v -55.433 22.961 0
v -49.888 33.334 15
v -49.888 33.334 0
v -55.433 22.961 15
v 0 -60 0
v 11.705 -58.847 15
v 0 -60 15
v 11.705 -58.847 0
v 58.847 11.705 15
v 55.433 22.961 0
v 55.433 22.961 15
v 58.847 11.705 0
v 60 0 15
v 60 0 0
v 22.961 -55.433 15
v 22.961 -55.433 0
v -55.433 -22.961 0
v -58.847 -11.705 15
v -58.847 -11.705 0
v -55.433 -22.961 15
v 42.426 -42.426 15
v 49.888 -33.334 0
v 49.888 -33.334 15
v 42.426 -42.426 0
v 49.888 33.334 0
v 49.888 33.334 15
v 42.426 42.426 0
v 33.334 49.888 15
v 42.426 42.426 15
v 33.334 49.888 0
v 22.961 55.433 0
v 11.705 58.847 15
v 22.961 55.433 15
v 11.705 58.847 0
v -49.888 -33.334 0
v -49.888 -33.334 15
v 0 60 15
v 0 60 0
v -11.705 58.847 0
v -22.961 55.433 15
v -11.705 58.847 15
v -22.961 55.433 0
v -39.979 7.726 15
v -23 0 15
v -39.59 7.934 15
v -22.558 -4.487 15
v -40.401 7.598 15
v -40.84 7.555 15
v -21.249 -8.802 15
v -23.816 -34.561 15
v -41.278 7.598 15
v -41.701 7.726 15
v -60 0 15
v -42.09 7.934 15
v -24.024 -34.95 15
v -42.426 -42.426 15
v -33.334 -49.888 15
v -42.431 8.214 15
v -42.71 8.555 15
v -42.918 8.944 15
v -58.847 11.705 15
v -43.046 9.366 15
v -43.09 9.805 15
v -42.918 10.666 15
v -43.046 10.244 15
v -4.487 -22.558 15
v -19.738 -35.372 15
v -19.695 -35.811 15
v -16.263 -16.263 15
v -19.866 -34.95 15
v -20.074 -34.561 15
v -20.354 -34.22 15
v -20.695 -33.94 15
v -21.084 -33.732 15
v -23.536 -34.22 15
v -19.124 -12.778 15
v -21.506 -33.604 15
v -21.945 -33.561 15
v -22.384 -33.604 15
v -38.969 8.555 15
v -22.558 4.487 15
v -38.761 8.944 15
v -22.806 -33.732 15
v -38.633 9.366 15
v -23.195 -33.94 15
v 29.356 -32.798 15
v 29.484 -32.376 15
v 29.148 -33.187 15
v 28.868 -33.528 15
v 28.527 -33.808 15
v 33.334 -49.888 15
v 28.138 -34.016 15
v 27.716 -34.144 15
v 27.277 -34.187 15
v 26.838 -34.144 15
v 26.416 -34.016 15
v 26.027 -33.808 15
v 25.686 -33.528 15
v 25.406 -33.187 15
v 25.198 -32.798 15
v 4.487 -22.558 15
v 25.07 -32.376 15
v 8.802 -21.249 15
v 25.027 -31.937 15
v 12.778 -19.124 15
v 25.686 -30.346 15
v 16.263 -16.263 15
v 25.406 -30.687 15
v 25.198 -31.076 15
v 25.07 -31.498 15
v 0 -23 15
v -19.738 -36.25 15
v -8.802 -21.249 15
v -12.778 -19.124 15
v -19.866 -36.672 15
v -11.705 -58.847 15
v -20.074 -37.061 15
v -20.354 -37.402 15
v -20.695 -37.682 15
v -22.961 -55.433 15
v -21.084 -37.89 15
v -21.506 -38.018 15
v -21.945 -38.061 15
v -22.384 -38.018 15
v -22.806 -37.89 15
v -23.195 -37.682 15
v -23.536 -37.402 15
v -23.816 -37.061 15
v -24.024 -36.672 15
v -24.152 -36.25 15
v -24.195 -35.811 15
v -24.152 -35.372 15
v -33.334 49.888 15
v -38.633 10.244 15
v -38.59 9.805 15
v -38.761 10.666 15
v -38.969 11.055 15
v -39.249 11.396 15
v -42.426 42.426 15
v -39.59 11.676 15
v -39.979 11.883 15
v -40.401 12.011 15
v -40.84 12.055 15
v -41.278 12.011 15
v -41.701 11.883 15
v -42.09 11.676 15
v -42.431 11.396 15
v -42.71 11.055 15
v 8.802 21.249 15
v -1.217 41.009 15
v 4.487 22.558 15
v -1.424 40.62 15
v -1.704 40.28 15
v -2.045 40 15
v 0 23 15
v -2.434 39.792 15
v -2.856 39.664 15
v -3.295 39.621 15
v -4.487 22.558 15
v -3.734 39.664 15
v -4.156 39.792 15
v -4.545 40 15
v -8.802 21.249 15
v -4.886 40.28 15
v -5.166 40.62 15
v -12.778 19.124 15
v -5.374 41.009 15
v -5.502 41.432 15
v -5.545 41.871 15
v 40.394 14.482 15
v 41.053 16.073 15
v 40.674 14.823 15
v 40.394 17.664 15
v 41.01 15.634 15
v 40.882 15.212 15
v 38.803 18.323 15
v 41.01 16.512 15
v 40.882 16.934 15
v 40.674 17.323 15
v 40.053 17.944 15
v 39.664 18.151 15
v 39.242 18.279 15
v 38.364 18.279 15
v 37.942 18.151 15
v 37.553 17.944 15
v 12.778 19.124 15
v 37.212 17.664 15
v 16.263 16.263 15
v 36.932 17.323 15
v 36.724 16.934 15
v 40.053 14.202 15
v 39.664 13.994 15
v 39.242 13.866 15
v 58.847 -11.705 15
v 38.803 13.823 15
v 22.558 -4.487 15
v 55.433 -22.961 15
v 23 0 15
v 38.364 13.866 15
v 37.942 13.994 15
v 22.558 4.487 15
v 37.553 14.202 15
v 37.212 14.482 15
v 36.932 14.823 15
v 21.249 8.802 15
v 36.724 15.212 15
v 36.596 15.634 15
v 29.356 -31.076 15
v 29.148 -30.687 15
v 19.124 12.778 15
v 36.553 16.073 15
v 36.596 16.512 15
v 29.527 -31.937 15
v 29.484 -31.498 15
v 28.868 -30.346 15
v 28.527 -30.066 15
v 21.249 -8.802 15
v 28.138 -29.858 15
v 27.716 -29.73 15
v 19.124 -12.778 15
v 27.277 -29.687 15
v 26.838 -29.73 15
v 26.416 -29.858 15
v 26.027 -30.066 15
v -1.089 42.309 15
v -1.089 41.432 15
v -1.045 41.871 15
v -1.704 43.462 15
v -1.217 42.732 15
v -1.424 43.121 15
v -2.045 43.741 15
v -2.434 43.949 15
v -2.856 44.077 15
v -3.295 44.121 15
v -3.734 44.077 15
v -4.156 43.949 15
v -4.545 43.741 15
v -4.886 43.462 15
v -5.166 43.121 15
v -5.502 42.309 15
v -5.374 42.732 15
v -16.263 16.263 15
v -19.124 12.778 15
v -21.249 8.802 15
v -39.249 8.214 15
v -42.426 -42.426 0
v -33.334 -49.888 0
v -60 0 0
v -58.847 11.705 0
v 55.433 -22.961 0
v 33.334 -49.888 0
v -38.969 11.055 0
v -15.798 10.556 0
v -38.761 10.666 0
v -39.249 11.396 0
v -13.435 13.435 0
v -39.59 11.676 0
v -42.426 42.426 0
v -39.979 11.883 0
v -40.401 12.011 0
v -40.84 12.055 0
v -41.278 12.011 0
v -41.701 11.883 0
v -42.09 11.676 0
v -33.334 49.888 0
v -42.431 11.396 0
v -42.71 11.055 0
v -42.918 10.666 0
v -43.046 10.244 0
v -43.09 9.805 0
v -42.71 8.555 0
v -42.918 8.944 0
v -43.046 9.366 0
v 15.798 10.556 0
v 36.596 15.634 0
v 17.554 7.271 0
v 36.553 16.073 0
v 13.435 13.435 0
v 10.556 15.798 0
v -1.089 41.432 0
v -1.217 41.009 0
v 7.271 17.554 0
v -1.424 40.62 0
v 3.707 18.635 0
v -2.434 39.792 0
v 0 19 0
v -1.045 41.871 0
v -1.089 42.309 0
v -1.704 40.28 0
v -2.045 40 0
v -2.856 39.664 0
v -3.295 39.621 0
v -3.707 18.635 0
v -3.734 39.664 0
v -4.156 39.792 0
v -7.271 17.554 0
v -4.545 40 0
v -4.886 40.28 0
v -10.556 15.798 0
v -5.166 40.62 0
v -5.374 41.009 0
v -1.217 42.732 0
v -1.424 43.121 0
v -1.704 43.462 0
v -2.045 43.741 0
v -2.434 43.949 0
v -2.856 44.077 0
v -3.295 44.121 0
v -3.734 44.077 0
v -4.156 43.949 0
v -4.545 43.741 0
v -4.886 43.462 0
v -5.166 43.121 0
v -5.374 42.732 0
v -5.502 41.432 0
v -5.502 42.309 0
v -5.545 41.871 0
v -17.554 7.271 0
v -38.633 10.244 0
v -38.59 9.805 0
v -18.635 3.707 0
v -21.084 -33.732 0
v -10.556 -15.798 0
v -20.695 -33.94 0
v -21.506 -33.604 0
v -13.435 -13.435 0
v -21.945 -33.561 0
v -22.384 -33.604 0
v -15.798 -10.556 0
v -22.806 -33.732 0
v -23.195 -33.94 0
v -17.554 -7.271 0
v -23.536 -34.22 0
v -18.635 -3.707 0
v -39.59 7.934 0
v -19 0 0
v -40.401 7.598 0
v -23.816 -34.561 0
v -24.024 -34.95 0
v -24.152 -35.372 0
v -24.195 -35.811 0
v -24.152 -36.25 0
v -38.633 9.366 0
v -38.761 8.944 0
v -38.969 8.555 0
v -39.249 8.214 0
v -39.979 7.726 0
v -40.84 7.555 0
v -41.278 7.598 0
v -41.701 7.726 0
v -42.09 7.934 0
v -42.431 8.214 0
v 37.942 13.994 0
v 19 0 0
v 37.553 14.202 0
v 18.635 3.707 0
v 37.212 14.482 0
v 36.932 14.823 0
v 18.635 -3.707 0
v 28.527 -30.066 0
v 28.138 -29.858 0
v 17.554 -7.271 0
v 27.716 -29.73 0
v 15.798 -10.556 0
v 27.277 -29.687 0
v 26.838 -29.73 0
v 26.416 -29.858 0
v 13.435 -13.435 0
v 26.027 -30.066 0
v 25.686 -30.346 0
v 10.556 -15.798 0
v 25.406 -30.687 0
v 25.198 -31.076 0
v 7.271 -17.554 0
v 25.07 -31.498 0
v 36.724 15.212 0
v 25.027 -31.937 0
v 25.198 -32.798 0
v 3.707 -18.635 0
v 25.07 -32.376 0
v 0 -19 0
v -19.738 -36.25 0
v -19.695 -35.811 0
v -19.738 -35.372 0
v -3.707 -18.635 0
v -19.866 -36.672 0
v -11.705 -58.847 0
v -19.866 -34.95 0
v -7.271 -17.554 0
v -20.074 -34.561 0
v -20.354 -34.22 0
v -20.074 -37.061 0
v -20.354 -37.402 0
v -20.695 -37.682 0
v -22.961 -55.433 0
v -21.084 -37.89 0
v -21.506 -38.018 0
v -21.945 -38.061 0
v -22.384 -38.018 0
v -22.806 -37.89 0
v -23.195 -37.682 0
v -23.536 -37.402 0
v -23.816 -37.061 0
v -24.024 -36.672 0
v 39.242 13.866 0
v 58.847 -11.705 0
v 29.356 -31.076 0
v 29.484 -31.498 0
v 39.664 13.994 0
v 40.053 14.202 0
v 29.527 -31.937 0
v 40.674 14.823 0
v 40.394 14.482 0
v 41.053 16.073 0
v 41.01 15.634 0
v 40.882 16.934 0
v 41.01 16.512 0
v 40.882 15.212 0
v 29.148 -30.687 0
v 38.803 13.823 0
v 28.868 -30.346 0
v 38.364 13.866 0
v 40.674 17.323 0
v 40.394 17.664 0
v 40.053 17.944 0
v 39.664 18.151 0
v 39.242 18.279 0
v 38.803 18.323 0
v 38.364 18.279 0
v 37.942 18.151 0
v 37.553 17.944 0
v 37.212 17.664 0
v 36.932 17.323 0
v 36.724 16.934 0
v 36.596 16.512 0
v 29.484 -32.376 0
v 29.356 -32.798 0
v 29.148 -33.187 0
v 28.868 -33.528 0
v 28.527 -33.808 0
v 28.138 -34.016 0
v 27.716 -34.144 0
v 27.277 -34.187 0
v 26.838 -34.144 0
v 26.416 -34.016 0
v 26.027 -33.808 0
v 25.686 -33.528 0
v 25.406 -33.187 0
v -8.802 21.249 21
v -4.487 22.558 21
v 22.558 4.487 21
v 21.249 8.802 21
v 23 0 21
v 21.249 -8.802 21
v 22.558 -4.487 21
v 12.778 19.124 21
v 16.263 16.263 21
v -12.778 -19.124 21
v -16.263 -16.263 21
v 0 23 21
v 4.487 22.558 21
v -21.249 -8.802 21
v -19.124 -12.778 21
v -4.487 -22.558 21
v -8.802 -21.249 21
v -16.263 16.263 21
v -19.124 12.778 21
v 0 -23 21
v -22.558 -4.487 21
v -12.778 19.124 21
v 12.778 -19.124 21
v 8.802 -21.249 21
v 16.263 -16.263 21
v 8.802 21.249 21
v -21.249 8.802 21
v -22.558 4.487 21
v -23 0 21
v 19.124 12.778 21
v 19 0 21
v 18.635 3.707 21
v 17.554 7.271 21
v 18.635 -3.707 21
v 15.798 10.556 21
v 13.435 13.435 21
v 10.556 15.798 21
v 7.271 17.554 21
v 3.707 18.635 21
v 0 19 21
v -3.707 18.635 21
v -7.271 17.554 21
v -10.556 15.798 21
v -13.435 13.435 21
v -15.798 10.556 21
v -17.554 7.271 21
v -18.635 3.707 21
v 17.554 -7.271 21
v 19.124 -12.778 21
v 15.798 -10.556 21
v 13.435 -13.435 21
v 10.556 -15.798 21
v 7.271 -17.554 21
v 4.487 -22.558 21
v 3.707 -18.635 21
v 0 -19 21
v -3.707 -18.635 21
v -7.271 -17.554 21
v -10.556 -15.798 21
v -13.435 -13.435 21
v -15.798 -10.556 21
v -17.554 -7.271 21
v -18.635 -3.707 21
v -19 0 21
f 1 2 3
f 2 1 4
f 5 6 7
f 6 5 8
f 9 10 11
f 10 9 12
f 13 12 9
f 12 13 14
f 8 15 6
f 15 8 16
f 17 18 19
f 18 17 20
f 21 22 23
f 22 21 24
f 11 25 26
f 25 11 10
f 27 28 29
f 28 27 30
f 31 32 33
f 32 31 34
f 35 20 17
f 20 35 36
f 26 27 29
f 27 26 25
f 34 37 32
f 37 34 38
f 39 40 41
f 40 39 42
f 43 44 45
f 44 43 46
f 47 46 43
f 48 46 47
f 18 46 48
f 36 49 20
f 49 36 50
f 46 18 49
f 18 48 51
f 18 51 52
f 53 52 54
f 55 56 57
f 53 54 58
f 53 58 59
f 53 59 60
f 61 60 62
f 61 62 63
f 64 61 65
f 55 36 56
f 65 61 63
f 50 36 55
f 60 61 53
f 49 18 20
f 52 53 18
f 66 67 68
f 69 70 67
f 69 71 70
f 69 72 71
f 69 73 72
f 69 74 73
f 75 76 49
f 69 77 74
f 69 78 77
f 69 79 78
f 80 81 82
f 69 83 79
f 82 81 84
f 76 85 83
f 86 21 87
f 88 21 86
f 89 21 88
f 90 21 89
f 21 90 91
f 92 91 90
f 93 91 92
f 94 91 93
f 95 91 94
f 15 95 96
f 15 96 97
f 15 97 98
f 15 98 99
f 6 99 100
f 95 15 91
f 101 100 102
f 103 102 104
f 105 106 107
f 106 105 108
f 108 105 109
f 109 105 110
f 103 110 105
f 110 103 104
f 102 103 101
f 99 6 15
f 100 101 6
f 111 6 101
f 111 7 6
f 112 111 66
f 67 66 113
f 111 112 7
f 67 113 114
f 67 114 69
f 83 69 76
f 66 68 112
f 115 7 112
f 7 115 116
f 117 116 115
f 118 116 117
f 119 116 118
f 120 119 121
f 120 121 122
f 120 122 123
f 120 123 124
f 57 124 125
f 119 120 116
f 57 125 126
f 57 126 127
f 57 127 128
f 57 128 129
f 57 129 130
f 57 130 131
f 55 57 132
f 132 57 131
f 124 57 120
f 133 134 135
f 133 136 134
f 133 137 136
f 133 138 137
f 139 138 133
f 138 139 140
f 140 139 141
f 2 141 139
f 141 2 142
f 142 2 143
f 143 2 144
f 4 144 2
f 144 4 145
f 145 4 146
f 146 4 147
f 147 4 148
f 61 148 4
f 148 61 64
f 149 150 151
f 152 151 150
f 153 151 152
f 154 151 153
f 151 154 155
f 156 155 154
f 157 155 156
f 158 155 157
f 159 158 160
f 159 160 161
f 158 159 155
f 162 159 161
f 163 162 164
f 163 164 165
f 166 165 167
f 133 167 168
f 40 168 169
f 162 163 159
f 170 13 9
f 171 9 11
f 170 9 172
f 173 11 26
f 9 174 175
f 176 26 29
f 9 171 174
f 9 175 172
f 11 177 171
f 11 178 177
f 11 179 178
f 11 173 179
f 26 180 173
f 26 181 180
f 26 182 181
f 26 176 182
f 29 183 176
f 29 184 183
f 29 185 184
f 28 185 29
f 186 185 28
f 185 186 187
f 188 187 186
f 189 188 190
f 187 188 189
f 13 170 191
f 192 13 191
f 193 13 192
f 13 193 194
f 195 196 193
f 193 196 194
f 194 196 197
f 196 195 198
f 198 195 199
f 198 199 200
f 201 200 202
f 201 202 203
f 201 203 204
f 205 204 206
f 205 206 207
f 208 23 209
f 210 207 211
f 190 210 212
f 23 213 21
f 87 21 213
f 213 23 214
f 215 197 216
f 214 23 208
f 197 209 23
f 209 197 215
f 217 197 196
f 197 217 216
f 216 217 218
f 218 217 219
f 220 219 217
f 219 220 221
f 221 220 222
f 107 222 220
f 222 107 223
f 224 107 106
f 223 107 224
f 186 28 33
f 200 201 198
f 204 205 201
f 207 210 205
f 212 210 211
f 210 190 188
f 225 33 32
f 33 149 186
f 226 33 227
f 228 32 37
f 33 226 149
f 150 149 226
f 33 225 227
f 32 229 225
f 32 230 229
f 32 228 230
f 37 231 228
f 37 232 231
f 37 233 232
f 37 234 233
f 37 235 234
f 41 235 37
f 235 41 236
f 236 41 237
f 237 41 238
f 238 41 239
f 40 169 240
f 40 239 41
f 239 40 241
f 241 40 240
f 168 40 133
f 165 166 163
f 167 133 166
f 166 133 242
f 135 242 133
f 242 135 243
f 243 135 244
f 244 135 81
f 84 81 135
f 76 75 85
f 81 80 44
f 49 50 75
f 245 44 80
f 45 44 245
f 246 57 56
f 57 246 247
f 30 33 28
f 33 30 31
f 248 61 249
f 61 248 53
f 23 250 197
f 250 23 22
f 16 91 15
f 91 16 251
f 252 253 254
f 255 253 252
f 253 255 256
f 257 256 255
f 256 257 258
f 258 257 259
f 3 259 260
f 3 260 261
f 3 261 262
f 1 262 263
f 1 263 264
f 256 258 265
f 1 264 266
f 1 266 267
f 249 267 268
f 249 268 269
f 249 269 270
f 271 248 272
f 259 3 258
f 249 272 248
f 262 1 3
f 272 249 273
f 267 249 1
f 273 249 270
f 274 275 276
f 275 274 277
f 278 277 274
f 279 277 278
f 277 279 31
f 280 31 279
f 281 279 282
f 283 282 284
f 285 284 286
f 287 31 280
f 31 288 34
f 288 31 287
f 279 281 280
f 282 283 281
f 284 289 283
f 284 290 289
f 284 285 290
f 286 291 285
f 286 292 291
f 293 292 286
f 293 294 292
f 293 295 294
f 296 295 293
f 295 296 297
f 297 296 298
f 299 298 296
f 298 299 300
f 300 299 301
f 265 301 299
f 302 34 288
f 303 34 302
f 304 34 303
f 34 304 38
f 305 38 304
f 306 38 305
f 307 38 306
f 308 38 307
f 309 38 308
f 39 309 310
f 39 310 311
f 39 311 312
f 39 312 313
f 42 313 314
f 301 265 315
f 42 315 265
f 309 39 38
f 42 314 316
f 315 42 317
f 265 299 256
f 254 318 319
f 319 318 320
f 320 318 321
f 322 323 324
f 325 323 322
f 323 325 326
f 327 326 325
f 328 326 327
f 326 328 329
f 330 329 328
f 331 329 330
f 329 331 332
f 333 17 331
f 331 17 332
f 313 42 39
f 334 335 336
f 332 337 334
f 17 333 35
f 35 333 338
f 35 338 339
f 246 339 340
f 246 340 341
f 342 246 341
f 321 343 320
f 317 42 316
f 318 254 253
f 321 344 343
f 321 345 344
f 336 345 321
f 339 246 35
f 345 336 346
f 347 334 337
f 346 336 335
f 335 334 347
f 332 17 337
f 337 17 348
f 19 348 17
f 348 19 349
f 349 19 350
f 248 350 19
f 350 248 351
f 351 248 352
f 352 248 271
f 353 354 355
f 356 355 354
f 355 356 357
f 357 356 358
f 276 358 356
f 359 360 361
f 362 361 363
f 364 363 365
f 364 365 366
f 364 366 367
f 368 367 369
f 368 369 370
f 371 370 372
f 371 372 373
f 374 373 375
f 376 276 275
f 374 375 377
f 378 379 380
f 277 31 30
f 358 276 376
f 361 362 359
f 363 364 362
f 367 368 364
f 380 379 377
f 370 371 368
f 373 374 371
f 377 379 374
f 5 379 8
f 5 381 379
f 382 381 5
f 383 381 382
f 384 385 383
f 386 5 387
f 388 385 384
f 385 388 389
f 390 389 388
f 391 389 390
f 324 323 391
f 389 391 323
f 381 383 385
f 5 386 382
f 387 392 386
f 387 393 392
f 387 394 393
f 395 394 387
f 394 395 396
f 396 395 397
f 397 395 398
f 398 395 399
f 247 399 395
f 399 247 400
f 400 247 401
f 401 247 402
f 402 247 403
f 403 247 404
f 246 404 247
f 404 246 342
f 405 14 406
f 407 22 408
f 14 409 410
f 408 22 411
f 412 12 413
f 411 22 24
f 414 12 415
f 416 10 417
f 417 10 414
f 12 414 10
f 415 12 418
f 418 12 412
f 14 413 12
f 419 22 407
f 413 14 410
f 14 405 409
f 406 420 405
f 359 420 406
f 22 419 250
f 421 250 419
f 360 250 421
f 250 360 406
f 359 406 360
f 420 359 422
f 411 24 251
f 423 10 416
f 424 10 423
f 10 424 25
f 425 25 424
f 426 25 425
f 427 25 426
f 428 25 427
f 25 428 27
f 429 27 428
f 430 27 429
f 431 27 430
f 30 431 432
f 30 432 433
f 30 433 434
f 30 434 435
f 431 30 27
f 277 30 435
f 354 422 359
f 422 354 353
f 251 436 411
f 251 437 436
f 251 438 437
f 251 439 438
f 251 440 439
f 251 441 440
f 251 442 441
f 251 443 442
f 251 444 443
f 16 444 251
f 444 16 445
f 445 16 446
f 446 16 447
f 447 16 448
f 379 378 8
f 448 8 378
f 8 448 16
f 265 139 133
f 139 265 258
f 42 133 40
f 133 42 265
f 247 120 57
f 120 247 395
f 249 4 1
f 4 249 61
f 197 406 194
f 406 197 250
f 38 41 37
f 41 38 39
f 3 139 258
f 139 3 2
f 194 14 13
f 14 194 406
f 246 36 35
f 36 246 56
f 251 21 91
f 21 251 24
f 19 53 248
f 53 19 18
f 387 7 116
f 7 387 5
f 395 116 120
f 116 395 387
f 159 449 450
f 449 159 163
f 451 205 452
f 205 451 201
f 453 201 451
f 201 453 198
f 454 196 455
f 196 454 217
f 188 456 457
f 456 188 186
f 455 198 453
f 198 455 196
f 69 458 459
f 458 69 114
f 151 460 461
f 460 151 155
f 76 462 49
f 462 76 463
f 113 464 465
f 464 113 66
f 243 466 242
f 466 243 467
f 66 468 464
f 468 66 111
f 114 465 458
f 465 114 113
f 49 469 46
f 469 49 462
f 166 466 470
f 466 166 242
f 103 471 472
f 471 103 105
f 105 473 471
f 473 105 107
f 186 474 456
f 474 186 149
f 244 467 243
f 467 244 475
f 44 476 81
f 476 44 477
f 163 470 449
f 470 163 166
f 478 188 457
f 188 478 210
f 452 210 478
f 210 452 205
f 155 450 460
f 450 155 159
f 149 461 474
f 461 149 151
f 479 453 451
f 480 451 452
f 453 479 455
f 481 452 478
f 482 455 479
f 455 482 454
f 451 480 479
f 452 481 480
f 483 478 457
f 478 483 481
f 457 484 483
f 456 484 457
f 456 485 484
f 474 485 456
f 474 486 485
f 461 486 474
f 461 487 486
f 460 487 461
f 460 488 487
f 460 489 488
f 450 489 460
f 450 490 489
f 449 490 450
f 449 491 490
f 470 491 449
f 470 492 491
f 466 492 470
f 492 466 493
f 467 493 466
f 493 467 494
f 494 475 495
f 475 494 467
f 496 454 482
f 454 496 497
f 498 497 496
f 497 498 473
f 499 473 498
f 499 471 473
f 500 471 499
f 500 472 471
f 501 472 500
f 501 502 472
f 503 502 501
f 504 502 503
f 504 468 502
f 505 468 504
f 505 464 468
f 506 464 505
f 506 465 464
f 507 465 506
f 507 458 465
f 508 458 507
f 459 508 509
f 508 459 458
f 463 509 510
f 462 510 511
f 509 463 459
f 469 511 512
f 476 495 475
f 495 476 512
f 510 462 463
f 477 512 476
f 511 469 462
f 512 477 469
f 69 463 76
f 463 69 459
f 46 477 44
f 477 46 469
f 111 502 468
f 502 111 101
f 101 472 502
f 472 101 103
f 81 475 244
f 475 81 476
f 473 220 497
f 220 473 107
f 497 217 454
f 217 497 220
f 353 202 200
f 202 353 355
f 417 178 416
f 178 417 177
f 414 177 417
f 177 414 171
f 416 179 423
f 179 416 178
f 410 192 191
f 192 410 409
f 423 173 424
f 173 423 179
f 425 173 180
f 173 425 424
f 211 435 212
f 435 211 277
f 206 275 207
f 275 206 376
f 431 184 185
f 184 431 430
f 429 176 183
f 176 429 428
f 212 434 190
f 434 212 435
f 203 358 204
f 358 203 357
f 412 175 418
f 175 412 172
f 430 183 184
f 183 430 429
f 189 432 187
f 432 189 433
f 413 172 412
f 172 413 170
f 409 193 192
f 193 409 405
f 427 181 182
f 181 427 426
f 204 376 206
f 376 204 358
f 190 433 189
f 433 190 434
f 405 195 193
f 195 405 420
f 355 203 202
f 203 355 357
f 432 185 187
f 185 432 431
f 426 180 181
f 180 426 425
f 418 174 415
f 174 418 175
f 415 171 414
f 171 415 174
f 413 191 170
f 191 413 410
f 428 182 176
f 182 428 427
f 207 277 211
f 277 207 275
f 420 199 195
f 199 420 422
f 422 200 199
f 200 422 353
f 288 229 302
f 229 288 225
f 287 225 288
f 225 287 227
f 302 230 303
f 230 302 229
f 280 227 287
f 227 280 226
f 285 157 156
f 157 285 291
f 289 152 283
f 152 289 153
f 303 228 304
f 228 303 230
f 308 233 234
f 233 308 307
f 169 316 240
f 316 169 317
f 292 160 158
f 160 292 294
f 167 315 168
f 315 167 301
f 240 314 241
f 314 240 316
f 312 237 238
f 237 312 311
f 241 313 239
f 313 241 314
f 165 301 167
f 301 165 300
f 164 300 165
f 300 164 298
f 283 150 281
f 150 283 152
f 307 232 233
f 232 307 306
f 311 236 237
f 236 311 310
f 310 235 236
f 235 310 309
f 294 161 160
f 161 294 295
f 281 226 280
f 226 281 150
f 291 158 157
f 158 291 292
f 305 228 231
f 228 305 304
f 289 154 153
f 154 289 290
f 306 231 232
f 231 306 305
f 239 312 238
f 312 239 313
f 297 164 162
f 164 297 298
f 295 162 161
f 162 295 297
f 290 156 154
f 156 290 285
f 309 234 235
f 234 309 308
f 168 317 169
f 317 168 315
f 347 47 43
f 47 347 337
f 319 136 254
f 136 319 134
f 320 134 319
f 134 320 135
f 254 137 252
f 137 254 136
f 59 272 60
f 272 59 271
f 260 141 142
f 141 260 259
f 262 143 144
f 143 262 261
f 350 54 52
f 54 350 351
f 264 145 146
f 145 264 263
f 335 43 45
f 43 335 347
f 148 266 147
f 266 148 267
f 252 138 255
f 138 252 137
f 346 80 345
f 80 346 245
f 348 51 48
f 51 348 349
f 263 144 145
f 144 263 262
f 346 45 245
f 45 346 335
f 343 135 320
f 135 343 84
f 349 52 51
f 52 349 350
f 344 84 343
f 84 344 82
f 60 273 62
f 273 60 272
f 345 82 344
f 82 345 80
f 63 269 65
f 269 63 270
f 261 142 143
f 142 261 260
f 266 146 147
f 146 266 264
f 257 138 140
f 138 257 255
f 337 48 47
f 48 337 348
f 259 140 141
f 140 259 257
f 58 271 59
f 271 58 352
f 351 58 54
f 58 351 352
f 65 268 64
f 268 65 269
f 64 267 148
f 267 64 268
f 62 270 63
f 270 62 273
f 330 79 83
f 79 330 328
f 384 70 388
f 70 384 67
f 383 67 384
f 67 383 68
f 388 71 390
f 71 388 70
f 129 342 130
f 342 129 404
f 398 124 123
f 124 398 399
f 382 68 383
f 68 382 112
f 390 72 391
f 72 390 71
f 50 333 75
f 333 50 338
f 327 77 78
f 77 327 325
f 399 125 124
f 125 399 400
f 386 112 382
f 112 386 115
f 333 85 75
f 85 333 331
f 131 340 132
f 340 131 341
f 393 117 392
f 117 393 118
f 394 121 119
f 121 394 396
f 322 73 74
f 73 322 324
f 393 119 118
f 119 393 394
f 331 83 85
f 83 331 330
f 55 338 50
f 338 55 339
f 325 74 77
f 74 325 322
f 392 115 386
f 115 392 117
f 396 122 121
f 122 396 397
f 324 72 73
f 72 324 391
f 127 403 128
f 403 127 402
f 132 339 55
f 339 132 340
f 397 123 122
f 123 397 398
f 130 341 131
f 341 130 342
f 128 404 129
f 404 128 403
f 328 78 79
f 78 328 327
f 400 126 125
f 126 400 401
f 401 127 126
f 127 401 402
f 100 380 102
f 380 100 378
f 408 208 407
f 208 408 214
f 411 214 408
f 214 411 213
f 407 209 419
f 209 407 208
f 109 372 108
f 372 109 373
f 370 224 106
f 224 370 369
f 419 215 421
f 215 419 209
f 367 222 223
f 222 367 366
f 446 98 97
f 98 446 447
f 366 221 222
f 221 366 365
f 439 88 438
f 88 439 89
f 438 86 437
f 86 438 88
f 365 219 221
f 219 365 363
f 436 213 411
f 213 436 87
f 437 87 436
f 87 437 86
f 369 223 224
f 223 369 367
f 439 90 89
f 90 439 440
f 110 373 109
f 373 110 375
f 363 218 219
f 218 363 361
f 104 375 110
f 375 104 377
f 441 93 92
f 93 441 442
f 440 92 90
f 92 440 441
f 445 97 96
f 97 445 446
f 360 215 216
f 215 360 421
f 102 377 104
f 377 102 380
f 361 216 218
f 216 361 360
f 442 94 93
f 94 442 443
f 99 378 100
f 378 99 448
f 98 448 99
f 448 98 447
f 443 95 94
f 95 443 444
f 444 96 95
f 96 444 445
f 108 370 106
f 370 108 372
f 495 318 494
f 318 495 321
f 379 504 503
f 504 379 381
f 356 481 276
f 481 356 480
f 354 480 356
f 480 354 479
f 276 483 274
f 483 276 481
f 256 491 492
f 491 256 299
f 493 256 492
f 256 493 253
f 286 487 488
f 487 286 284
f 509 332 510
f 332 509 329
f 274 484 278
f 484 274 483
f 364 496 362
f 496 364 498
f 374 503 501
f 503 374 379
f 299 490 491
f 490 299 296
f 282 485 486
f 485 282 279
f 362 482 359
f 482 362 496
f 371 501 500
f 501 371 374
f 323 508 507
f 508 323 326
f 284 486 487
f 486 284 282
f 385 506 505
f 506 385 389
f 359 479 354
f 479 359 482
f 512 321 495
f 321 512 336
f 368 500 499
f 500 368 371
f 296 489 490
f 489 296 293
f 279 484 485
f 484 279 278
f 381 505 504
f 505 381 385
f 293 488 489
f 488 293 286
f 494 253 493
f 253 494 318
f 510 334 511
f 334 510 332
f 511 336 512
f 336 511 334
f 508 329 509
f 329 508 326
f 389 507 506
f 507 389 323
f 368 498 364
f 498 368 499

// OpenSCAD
$fn = 32;

// ----------------------------------------------------------------------
// Flange Ø120 x 15
// 5 holes on a Ø84 bolt circle, bolted joints
// ----------------------------------------------------------------------

// --- parameters (mm) ---
flange_d = 120;    // outside diameter of the flange
thickness = 15;    // flange thickness
holes = 5;         // number of bolt holes
pcd = 84;          // bolt circle diameter
start_deg = 22.5;  // angle of the first hole, from +X
hole_d = 4.5;      // bolt hole diameter
bore_d = 38;       // central through bore
hub_d = 46;        // hub outside diameter
hub_h = 6;         // hub height above the flange face (0 = no hub)

// --- derived feature positions (mm) ---
height = thickness + hub_h;  // = 21   overall height of the part
pcd_r = pcd / 2;             // = 42   bolt circle radius
hole_step = 360 / holes;     // = 72   angular pitch
feature_centers = [
  [pcd_r * cos(start_deg + 0 * hole_step), pcd_r * sin(start_deg + 0 * hole_step)],
  [pcd_r * cos(start_deg + 1 * hole_step), pcd_r * sin(start_deg + 1 * hole_step)],
  [pcd_r * cos(start_deg + 2 * hole_step), pcd_r * sin(start_deg + 2 * hole_step)],
  [pcd_r * cos(start_deg + 3 * hole_step), pcd_r * sin(start_deg + 3 * hole_step)],
  [pcd_r * cos(start_deg + 4 * hole_step), pcd_r * sin(start_deg + 4 * hole_step)]
];   // bolt hole centres on the pitch circle

// flange disc, every hole and the bore cut straight through
difference() {
  union() {
    cylinder(d = flange_d, h = thickness);
    cylinder(d = hub_d, h = height);  // hub, overlapped into the flange
  }
  translate([0, 0, -1]) cylinder(d = bore_d, h = height + 2);  // bore, through
  for (centre = feature_centers)
    translate([centre[0], centre[1], -1]) cylinder(d = hole_d, h = thickness + 2);
}
